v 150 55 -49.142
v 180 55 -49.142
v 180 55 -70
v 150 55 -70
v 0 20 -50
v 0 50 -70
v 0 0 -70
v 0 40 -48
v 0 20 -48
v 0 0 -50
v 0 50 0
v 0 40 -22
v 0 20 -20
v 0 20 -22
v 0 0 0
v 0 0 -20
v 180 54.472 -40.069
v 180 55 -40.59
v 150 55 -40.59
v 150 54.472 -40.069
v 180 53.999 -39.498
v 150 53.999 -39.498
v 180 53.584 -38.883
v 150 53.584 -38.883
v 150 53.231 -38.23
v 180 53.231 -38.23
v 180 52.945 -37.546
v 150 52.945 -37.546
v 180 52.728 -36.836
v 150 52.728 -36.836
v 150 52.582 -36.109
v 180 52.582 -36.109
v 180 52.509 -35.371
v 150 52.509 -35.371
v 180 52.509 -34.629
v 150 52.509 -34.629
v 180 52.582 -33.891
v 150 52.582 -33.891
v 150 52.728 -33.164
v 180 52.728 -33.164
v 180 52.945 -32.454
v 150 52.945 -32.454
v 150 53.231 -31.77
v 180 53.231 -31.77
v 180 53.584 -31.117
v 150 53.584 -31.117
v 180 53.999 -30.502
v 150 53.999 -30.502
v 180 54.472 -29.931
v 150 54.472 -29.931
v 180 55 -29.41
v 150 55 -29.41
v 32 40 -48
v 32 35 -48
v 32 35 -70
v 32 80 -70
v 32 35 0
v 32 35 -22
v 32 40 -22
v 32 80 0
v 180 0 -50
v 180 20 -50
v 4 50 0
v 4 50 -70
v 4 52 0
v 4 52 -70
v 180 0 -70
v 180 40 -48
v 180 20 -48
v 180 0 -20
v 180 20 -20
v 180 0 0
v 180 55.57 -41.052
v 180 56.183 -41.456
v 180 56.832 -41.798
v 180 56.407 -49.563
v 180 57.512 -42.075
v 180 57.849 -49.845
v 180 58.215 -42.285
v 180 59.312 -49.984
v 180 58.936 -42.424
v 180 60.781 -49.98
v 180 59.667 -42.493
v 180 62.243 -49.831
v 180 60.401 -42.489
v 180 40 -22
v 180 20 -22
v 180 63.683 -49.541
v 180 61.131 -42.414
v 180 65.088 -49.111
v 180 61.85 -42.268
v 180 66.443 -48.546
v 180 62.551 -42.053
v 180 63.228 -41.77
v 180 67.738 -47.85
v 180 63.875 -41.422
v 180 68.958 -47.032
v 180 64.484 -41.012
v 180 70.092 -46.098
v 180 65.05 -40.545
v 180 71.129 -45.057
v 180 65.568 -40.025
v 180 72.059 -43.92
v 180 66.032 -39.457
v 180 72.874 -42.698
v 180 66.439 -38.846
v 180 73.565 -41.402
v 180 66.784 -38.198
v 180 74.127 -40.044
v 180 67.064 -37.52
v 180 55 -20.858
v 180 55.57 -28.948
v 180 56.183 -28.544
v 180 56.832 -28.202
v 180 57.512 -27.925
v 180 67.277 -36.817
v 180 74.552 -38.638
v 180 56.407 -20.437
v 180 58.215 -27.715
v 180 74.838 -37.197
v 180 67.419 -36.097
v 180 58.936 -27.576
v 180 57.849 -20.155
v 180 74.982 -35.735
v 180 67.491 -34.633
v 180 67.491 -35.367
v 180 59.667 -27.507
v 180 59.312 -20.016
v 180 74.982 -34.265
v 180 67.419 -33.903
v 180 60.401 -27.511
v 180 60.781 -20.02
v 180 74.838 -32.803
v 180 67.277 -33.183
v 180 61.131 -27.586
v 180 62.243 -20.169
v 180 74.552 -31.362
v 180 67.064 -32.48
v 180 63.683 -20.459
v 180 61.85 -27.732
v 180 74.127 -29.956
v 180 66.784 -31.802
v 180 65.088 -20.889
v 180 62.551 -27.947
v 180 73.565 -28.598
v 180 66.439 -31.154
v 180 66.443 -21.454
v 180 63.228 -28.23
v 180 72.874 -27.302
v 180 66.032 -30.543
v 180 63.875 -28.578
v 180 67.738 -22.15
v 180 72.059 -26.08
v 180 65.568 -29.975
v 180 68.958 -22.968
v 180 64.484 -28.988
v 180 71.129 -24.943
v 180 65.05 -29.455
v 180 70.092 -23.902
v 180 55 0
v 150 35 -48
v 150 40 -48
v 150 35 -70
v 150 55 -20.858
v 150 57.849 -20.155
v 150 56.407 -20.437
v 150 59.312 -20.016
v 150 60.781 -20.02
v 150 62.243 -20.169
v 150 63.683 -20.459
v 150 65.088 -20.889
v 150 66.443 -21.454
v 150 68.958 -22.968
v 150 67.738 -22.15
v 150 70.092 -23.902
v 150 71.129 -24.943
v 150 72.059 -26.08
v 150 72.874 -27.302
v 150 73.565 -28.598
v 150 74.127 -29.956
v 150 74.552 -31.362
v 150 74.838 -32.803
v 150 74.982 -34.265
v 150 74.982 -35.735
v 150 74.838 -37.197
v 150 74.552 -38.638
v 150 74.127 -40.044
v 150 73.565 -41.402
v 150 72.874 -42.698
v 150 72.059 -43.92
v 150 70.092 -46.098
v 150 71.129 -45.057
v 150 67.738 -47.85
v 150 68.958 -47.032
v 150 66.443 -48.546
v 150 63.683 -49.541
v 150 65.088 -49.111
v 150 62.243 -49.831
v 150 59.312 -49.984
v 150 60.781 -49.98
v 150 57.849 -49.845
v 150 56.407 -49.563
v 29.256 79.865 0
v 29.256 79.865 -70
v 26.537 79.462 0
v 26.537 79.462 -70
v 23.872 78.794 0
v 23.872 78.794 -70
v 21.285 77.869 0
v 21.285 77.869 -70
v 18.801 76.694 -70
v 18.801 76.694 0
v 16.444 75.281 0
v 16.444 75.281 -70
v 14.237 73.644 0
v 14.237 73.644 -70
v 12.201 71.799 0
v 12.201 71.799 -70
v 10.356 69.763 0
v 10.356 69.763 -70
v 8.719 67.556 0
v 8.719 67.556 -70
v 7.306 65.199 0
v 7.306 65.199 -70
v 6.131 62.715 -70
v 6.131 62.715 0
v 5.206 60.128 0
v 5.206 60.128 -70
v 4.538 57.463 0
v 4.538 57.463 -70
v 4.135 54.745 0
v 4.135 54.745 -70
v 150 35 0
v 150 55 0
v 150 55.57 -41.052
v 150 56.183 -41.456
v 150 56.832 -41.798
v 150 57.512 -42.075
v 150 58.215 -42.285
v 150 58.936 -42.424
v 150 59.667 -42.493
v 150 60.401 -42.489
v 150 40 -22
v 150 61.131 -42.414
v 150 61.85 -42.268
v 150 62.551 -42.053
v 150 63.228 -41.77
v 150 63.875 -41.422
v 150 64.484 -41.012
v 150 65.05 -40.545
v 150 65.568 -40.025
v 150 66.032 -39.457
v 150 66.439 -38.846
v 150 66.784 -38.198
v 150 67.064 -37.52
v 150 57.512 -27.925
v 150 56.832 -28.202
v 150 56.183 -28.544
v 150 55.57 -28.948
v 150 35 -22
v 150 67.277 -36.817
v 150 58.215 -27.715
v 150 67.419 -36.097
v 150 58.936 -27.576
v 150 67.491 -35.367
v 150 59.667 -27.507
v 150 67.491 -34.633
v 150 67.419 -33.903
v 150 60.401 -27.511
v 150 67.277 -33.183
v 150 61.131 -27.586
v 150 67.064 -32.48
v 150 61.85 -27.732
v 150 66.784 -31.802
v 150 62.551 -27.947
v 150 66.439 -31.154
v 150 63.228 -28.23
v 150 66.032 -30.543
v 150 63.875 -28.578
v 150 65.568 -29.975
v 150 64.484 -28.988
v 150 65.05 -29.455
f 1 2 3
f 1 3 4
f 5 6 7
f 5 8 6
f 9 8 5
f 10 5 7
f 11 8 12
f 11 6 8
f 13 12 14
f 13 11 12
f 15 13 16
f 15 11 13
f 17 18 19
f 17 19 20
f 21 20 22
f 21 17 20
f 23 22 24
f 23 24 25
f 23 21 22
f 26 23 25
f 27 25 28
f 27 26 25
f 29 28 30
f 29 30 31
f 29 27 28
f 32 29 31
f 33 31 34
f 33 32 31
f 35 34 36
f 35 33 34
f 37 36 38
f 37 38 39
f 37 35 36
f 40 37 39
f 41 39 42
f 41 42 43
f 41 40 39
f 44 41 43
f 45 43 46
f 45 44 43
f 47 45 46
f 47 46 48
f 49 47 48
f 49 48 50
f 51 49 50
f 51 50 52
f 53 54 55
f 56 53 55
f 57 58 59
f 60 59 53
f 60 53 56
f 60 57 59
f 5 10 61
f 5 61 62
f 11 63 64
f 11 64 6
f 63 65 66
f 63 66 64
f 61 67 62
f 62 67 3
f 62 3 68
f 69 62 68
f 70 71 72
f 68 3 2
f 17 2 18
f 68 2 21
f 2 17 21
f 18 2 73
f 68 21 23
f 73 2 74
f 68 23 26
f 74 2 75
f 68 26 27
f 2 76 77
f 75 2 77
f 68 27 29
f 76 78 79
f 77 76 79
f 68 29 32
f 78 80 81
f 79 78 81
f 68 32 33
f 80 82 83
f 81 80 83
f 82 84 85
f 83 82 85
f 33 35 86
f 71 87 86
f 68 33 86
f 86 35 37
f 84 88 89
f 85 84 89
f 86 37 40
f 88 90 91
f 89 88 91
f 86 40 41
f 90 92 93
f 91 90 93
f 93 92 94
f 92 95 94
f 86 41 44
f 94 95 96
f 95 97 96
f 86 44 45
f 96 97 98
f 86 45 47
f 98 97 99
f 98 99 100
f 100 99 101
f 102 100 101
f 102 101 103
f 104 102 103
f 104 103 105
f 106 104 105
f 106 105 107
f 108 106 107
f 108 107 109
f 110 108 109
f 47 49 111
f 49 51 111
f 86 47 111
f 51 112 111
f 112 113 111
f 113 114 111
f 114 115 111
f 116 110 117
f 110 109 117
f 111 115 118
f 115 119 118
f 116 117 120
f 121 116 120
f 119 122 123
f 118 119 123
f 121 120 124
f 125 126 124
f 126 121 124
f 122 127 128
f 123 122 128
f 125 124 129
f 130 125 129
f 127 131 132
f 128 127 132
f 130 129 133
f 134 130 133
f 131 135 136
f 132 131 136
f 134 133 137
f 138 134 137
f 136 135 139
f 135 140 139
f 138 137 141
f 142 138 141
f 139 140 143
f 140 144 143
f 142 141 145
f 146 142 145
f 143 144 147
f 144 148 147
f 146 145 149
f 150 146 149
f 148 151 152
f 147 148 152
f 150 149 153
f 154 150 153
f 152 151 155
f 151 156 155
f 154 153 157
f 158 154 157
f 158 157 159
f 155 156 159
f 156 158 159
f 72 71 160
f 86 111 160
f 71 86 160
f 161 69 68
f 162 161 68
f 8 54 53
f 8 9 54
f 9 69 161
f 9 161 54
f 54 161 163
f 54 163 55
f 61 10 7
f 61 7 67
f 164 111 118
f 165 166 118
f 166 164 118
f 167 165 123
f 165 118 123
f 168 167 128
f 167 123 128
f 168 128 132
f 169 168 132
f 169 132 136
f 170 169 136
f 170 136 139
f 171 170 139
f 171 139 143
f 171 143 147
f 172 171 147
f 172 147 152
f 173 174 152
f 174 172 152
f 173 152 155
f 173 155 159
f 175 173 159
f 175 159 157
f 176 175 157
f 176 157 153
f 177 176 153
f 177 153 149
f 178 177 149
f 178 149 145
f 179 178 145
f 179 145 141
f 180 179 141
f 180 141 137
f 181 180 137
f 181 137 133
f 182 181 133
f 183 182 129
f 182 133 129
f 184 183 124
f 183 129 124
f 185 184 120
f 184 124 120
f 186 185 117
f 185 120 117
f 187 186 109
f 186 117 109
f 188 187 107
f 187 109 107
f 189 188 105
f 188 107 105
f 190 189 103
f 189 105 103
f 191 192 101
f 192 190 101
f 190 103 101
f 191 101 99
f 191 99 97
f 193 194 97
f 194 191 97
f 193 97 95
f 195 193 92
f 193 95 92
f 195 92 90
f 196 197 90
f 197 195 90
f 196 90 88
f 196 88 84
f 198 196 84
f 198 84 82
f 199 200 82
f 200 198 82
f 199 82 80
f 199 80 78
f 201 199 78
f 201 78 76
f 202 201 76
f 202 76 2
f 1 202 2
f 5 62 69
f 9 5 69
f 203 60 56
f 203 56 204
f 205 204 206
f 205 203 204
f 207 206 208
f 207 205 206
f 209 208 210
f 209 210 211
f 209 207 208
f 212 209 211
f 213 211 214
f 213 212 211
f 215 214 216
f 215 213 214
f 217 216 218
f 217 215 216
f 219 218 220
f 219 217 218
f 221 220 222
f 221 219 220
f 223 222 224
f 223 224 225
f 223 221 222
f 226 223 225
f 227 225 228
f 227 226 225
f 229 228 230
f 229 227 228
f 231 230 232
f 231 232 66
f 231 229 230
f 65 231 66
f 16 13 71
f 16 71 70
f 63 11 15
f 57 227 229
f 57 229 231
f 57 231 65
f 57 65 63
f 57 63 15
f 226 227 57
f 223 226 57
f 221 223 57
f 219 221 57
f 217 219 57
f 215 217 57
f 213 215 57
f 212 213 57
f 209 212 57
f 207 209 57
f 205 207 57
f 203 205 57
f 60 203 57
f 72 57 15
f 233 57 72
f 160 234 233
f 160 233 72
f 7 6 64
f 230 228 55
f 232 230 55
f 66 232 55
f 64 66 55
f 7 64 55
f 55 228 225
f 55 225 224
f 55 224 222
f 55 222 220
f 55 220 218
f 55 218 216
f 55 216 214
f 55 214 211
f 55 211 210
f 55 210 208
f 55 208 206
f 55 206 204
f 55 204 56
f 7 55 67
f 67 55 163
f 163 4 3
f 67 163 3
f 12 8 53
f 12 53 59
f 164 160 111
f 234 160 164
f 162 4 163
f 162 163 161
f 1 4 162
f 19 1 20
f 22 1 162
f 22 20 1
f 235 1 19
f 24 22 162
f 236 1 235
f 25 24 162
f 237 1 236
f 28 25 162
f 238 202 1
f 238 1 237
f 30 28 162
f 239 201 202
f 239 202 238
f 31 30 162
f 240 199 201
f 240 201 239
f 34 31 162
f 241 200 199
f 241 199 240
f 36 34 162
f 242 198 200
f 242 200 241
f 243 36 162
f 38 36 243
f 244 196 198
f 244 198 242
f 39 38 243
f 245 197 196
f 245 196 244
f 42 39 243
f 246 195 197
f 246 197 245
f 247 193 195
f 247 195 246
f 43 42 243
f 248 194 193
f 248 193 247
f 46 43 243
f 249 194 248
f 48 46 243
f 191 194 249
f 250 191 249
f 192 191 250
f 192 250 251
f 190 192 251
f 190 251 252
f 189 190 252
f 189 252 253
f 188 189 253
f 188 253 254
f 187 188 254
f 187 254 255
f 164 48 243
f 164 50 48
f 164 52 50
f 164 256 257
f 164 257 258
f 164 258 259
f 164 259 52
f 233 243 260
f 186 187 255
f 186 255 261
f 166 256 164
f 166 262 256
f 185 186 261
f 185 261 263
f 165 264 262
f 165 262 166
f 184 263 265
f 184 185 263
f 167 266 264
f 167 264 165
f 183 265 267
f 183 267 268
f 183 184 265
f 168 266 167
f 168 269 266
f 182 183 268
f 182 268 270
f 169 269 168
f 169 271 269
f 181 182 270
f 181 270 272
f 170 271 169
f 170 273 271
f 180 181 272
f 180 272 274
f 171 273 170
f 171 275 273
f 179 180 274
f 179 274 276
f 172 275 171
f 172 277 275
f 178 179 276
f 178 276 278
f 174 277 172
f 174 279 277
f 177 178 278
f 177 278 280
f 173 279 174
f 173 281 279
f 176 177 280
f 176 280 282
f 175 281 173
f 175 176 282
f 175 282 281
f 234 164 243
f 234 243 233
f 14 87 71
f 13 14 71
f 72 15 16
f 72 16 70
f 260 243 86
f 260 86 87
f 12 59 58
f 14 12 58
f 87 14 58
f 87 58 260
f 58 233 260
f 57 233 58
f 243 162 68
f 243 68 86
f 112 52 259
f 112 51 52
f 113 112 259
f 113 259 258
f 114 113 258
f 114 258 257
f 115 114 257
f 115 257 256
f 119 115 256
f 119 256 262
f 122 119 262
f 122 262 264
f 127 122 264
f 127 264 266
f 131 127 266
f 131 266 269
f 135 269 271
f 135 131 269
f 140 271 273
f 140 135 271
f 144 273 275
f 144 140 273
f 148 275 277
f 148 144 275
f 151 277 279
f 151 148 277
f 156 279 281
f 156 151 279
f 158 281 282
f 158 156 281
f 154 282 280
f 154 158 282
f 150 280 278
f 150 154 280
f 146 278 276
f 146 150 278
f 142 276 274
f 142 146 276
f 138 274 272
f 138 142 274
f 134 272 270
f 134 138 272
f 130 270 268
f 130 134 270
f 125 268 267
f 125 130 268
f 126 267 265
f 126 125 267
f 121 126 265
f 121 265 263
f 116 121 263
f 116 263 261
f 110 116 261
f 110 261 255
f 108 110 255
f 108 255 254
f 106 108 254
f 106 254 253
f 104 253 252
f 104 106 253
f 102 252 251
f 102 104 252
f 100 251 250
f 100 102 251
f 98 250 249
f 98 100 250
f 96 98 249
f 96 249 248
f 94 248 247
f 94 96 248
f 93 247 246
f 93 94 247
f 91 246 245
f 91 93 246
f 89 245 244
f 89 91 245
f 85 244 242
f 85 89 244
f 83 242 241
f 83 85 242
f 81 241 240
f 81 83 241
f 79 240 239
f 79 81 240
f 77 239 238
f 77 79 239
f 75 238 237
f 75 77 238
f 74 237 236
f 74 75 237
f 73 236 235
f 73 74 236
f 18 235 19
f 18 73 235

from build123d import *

# Parameters (mm, degrees)
BOSS_EXTRUDE1_DEPTH = 70
CUT_EXTRUDE3_DEPTH  = 196
SKETCH5_R           = 15
BOSS_EXTRUDE3_DEPTH = 30
CUT_EXTRUDE4_DEPTH  = 30


with BuildPart() as part:
    # Sketch1 → Boss-Extrude1 (new body)
    with BuildSketch(Plane.XY):
        with BuildLine():
            Line((0, 0), (180, 0))
            Line((180, 0), (180, 55))
            Line((180, 55), (150, 55))
            Line((150, 55), (150, 35))
            Line((150, 35), (32, 35))
            Line((32, 35), (32, 80))
            ThreePointArc((32, 80), (12.200980837, 71.799019163), (4, 52.0001))
            Line((4, 52.0001), (4, 50))
            Line((4, 50), (0, 50))
            Line((0, 50), (0, 0))
        make_face()
    extrude(amount=-BOSS_EXTRUDE1_DEPTH)

    # Sketch2 → Cut-Extrude3 (cut)
    with BuildSketch(Plane.ZY):
        Polygon((-50, 0), (-50, 20), (-48, 20), (-48, 40), (-22, 40), (-22, 20), (-20, 20), (-20, 0), align=None)
    extrude(amount=-CUT_EXTRUDE3_DEPTH, mode=Mode.SUBTRACT)

    # Sketch5 → Boss-Extrude3 (add)
    with BuildSketch(Plane.ZY.offset(-180)):
        with Locations((-35, 60)):
            Circle(SKETCH5_R)
        with BuildLine():
            ThreePointArc((-27.5, 60), (-27.993707308, 57.323834327), (-29.409830056, 55))
            ThreePointArc((-29.409830056, 55), (-35, 52.5), (-40.590169944, 55))
            ThreePointArc((-40.590169944, 55), (-37.676165673, 67.006292692), (-27.5, 60))
        make_face(mode=Mode.SUBTRACT)
    extrude(amount=BOSS_EXTRUDE3_DEPTH)

    # Sketch5<3> → Cut-Extrude4 (cut)
    with BuildSketch(Plane.ZY.offset(-180)):
        with BuildLine():
            ThreePointArc((-40.590169944, 55), (-35, 52.5), (-29.409830056, 55))
            Line((-29.409830056, 55), (-40.590169944, 55))
        make_face()
    extrude(amount=CUT_EXTRUDE4_DEPTH, mode=Mode.SUBTRACT)


solid = part.part
